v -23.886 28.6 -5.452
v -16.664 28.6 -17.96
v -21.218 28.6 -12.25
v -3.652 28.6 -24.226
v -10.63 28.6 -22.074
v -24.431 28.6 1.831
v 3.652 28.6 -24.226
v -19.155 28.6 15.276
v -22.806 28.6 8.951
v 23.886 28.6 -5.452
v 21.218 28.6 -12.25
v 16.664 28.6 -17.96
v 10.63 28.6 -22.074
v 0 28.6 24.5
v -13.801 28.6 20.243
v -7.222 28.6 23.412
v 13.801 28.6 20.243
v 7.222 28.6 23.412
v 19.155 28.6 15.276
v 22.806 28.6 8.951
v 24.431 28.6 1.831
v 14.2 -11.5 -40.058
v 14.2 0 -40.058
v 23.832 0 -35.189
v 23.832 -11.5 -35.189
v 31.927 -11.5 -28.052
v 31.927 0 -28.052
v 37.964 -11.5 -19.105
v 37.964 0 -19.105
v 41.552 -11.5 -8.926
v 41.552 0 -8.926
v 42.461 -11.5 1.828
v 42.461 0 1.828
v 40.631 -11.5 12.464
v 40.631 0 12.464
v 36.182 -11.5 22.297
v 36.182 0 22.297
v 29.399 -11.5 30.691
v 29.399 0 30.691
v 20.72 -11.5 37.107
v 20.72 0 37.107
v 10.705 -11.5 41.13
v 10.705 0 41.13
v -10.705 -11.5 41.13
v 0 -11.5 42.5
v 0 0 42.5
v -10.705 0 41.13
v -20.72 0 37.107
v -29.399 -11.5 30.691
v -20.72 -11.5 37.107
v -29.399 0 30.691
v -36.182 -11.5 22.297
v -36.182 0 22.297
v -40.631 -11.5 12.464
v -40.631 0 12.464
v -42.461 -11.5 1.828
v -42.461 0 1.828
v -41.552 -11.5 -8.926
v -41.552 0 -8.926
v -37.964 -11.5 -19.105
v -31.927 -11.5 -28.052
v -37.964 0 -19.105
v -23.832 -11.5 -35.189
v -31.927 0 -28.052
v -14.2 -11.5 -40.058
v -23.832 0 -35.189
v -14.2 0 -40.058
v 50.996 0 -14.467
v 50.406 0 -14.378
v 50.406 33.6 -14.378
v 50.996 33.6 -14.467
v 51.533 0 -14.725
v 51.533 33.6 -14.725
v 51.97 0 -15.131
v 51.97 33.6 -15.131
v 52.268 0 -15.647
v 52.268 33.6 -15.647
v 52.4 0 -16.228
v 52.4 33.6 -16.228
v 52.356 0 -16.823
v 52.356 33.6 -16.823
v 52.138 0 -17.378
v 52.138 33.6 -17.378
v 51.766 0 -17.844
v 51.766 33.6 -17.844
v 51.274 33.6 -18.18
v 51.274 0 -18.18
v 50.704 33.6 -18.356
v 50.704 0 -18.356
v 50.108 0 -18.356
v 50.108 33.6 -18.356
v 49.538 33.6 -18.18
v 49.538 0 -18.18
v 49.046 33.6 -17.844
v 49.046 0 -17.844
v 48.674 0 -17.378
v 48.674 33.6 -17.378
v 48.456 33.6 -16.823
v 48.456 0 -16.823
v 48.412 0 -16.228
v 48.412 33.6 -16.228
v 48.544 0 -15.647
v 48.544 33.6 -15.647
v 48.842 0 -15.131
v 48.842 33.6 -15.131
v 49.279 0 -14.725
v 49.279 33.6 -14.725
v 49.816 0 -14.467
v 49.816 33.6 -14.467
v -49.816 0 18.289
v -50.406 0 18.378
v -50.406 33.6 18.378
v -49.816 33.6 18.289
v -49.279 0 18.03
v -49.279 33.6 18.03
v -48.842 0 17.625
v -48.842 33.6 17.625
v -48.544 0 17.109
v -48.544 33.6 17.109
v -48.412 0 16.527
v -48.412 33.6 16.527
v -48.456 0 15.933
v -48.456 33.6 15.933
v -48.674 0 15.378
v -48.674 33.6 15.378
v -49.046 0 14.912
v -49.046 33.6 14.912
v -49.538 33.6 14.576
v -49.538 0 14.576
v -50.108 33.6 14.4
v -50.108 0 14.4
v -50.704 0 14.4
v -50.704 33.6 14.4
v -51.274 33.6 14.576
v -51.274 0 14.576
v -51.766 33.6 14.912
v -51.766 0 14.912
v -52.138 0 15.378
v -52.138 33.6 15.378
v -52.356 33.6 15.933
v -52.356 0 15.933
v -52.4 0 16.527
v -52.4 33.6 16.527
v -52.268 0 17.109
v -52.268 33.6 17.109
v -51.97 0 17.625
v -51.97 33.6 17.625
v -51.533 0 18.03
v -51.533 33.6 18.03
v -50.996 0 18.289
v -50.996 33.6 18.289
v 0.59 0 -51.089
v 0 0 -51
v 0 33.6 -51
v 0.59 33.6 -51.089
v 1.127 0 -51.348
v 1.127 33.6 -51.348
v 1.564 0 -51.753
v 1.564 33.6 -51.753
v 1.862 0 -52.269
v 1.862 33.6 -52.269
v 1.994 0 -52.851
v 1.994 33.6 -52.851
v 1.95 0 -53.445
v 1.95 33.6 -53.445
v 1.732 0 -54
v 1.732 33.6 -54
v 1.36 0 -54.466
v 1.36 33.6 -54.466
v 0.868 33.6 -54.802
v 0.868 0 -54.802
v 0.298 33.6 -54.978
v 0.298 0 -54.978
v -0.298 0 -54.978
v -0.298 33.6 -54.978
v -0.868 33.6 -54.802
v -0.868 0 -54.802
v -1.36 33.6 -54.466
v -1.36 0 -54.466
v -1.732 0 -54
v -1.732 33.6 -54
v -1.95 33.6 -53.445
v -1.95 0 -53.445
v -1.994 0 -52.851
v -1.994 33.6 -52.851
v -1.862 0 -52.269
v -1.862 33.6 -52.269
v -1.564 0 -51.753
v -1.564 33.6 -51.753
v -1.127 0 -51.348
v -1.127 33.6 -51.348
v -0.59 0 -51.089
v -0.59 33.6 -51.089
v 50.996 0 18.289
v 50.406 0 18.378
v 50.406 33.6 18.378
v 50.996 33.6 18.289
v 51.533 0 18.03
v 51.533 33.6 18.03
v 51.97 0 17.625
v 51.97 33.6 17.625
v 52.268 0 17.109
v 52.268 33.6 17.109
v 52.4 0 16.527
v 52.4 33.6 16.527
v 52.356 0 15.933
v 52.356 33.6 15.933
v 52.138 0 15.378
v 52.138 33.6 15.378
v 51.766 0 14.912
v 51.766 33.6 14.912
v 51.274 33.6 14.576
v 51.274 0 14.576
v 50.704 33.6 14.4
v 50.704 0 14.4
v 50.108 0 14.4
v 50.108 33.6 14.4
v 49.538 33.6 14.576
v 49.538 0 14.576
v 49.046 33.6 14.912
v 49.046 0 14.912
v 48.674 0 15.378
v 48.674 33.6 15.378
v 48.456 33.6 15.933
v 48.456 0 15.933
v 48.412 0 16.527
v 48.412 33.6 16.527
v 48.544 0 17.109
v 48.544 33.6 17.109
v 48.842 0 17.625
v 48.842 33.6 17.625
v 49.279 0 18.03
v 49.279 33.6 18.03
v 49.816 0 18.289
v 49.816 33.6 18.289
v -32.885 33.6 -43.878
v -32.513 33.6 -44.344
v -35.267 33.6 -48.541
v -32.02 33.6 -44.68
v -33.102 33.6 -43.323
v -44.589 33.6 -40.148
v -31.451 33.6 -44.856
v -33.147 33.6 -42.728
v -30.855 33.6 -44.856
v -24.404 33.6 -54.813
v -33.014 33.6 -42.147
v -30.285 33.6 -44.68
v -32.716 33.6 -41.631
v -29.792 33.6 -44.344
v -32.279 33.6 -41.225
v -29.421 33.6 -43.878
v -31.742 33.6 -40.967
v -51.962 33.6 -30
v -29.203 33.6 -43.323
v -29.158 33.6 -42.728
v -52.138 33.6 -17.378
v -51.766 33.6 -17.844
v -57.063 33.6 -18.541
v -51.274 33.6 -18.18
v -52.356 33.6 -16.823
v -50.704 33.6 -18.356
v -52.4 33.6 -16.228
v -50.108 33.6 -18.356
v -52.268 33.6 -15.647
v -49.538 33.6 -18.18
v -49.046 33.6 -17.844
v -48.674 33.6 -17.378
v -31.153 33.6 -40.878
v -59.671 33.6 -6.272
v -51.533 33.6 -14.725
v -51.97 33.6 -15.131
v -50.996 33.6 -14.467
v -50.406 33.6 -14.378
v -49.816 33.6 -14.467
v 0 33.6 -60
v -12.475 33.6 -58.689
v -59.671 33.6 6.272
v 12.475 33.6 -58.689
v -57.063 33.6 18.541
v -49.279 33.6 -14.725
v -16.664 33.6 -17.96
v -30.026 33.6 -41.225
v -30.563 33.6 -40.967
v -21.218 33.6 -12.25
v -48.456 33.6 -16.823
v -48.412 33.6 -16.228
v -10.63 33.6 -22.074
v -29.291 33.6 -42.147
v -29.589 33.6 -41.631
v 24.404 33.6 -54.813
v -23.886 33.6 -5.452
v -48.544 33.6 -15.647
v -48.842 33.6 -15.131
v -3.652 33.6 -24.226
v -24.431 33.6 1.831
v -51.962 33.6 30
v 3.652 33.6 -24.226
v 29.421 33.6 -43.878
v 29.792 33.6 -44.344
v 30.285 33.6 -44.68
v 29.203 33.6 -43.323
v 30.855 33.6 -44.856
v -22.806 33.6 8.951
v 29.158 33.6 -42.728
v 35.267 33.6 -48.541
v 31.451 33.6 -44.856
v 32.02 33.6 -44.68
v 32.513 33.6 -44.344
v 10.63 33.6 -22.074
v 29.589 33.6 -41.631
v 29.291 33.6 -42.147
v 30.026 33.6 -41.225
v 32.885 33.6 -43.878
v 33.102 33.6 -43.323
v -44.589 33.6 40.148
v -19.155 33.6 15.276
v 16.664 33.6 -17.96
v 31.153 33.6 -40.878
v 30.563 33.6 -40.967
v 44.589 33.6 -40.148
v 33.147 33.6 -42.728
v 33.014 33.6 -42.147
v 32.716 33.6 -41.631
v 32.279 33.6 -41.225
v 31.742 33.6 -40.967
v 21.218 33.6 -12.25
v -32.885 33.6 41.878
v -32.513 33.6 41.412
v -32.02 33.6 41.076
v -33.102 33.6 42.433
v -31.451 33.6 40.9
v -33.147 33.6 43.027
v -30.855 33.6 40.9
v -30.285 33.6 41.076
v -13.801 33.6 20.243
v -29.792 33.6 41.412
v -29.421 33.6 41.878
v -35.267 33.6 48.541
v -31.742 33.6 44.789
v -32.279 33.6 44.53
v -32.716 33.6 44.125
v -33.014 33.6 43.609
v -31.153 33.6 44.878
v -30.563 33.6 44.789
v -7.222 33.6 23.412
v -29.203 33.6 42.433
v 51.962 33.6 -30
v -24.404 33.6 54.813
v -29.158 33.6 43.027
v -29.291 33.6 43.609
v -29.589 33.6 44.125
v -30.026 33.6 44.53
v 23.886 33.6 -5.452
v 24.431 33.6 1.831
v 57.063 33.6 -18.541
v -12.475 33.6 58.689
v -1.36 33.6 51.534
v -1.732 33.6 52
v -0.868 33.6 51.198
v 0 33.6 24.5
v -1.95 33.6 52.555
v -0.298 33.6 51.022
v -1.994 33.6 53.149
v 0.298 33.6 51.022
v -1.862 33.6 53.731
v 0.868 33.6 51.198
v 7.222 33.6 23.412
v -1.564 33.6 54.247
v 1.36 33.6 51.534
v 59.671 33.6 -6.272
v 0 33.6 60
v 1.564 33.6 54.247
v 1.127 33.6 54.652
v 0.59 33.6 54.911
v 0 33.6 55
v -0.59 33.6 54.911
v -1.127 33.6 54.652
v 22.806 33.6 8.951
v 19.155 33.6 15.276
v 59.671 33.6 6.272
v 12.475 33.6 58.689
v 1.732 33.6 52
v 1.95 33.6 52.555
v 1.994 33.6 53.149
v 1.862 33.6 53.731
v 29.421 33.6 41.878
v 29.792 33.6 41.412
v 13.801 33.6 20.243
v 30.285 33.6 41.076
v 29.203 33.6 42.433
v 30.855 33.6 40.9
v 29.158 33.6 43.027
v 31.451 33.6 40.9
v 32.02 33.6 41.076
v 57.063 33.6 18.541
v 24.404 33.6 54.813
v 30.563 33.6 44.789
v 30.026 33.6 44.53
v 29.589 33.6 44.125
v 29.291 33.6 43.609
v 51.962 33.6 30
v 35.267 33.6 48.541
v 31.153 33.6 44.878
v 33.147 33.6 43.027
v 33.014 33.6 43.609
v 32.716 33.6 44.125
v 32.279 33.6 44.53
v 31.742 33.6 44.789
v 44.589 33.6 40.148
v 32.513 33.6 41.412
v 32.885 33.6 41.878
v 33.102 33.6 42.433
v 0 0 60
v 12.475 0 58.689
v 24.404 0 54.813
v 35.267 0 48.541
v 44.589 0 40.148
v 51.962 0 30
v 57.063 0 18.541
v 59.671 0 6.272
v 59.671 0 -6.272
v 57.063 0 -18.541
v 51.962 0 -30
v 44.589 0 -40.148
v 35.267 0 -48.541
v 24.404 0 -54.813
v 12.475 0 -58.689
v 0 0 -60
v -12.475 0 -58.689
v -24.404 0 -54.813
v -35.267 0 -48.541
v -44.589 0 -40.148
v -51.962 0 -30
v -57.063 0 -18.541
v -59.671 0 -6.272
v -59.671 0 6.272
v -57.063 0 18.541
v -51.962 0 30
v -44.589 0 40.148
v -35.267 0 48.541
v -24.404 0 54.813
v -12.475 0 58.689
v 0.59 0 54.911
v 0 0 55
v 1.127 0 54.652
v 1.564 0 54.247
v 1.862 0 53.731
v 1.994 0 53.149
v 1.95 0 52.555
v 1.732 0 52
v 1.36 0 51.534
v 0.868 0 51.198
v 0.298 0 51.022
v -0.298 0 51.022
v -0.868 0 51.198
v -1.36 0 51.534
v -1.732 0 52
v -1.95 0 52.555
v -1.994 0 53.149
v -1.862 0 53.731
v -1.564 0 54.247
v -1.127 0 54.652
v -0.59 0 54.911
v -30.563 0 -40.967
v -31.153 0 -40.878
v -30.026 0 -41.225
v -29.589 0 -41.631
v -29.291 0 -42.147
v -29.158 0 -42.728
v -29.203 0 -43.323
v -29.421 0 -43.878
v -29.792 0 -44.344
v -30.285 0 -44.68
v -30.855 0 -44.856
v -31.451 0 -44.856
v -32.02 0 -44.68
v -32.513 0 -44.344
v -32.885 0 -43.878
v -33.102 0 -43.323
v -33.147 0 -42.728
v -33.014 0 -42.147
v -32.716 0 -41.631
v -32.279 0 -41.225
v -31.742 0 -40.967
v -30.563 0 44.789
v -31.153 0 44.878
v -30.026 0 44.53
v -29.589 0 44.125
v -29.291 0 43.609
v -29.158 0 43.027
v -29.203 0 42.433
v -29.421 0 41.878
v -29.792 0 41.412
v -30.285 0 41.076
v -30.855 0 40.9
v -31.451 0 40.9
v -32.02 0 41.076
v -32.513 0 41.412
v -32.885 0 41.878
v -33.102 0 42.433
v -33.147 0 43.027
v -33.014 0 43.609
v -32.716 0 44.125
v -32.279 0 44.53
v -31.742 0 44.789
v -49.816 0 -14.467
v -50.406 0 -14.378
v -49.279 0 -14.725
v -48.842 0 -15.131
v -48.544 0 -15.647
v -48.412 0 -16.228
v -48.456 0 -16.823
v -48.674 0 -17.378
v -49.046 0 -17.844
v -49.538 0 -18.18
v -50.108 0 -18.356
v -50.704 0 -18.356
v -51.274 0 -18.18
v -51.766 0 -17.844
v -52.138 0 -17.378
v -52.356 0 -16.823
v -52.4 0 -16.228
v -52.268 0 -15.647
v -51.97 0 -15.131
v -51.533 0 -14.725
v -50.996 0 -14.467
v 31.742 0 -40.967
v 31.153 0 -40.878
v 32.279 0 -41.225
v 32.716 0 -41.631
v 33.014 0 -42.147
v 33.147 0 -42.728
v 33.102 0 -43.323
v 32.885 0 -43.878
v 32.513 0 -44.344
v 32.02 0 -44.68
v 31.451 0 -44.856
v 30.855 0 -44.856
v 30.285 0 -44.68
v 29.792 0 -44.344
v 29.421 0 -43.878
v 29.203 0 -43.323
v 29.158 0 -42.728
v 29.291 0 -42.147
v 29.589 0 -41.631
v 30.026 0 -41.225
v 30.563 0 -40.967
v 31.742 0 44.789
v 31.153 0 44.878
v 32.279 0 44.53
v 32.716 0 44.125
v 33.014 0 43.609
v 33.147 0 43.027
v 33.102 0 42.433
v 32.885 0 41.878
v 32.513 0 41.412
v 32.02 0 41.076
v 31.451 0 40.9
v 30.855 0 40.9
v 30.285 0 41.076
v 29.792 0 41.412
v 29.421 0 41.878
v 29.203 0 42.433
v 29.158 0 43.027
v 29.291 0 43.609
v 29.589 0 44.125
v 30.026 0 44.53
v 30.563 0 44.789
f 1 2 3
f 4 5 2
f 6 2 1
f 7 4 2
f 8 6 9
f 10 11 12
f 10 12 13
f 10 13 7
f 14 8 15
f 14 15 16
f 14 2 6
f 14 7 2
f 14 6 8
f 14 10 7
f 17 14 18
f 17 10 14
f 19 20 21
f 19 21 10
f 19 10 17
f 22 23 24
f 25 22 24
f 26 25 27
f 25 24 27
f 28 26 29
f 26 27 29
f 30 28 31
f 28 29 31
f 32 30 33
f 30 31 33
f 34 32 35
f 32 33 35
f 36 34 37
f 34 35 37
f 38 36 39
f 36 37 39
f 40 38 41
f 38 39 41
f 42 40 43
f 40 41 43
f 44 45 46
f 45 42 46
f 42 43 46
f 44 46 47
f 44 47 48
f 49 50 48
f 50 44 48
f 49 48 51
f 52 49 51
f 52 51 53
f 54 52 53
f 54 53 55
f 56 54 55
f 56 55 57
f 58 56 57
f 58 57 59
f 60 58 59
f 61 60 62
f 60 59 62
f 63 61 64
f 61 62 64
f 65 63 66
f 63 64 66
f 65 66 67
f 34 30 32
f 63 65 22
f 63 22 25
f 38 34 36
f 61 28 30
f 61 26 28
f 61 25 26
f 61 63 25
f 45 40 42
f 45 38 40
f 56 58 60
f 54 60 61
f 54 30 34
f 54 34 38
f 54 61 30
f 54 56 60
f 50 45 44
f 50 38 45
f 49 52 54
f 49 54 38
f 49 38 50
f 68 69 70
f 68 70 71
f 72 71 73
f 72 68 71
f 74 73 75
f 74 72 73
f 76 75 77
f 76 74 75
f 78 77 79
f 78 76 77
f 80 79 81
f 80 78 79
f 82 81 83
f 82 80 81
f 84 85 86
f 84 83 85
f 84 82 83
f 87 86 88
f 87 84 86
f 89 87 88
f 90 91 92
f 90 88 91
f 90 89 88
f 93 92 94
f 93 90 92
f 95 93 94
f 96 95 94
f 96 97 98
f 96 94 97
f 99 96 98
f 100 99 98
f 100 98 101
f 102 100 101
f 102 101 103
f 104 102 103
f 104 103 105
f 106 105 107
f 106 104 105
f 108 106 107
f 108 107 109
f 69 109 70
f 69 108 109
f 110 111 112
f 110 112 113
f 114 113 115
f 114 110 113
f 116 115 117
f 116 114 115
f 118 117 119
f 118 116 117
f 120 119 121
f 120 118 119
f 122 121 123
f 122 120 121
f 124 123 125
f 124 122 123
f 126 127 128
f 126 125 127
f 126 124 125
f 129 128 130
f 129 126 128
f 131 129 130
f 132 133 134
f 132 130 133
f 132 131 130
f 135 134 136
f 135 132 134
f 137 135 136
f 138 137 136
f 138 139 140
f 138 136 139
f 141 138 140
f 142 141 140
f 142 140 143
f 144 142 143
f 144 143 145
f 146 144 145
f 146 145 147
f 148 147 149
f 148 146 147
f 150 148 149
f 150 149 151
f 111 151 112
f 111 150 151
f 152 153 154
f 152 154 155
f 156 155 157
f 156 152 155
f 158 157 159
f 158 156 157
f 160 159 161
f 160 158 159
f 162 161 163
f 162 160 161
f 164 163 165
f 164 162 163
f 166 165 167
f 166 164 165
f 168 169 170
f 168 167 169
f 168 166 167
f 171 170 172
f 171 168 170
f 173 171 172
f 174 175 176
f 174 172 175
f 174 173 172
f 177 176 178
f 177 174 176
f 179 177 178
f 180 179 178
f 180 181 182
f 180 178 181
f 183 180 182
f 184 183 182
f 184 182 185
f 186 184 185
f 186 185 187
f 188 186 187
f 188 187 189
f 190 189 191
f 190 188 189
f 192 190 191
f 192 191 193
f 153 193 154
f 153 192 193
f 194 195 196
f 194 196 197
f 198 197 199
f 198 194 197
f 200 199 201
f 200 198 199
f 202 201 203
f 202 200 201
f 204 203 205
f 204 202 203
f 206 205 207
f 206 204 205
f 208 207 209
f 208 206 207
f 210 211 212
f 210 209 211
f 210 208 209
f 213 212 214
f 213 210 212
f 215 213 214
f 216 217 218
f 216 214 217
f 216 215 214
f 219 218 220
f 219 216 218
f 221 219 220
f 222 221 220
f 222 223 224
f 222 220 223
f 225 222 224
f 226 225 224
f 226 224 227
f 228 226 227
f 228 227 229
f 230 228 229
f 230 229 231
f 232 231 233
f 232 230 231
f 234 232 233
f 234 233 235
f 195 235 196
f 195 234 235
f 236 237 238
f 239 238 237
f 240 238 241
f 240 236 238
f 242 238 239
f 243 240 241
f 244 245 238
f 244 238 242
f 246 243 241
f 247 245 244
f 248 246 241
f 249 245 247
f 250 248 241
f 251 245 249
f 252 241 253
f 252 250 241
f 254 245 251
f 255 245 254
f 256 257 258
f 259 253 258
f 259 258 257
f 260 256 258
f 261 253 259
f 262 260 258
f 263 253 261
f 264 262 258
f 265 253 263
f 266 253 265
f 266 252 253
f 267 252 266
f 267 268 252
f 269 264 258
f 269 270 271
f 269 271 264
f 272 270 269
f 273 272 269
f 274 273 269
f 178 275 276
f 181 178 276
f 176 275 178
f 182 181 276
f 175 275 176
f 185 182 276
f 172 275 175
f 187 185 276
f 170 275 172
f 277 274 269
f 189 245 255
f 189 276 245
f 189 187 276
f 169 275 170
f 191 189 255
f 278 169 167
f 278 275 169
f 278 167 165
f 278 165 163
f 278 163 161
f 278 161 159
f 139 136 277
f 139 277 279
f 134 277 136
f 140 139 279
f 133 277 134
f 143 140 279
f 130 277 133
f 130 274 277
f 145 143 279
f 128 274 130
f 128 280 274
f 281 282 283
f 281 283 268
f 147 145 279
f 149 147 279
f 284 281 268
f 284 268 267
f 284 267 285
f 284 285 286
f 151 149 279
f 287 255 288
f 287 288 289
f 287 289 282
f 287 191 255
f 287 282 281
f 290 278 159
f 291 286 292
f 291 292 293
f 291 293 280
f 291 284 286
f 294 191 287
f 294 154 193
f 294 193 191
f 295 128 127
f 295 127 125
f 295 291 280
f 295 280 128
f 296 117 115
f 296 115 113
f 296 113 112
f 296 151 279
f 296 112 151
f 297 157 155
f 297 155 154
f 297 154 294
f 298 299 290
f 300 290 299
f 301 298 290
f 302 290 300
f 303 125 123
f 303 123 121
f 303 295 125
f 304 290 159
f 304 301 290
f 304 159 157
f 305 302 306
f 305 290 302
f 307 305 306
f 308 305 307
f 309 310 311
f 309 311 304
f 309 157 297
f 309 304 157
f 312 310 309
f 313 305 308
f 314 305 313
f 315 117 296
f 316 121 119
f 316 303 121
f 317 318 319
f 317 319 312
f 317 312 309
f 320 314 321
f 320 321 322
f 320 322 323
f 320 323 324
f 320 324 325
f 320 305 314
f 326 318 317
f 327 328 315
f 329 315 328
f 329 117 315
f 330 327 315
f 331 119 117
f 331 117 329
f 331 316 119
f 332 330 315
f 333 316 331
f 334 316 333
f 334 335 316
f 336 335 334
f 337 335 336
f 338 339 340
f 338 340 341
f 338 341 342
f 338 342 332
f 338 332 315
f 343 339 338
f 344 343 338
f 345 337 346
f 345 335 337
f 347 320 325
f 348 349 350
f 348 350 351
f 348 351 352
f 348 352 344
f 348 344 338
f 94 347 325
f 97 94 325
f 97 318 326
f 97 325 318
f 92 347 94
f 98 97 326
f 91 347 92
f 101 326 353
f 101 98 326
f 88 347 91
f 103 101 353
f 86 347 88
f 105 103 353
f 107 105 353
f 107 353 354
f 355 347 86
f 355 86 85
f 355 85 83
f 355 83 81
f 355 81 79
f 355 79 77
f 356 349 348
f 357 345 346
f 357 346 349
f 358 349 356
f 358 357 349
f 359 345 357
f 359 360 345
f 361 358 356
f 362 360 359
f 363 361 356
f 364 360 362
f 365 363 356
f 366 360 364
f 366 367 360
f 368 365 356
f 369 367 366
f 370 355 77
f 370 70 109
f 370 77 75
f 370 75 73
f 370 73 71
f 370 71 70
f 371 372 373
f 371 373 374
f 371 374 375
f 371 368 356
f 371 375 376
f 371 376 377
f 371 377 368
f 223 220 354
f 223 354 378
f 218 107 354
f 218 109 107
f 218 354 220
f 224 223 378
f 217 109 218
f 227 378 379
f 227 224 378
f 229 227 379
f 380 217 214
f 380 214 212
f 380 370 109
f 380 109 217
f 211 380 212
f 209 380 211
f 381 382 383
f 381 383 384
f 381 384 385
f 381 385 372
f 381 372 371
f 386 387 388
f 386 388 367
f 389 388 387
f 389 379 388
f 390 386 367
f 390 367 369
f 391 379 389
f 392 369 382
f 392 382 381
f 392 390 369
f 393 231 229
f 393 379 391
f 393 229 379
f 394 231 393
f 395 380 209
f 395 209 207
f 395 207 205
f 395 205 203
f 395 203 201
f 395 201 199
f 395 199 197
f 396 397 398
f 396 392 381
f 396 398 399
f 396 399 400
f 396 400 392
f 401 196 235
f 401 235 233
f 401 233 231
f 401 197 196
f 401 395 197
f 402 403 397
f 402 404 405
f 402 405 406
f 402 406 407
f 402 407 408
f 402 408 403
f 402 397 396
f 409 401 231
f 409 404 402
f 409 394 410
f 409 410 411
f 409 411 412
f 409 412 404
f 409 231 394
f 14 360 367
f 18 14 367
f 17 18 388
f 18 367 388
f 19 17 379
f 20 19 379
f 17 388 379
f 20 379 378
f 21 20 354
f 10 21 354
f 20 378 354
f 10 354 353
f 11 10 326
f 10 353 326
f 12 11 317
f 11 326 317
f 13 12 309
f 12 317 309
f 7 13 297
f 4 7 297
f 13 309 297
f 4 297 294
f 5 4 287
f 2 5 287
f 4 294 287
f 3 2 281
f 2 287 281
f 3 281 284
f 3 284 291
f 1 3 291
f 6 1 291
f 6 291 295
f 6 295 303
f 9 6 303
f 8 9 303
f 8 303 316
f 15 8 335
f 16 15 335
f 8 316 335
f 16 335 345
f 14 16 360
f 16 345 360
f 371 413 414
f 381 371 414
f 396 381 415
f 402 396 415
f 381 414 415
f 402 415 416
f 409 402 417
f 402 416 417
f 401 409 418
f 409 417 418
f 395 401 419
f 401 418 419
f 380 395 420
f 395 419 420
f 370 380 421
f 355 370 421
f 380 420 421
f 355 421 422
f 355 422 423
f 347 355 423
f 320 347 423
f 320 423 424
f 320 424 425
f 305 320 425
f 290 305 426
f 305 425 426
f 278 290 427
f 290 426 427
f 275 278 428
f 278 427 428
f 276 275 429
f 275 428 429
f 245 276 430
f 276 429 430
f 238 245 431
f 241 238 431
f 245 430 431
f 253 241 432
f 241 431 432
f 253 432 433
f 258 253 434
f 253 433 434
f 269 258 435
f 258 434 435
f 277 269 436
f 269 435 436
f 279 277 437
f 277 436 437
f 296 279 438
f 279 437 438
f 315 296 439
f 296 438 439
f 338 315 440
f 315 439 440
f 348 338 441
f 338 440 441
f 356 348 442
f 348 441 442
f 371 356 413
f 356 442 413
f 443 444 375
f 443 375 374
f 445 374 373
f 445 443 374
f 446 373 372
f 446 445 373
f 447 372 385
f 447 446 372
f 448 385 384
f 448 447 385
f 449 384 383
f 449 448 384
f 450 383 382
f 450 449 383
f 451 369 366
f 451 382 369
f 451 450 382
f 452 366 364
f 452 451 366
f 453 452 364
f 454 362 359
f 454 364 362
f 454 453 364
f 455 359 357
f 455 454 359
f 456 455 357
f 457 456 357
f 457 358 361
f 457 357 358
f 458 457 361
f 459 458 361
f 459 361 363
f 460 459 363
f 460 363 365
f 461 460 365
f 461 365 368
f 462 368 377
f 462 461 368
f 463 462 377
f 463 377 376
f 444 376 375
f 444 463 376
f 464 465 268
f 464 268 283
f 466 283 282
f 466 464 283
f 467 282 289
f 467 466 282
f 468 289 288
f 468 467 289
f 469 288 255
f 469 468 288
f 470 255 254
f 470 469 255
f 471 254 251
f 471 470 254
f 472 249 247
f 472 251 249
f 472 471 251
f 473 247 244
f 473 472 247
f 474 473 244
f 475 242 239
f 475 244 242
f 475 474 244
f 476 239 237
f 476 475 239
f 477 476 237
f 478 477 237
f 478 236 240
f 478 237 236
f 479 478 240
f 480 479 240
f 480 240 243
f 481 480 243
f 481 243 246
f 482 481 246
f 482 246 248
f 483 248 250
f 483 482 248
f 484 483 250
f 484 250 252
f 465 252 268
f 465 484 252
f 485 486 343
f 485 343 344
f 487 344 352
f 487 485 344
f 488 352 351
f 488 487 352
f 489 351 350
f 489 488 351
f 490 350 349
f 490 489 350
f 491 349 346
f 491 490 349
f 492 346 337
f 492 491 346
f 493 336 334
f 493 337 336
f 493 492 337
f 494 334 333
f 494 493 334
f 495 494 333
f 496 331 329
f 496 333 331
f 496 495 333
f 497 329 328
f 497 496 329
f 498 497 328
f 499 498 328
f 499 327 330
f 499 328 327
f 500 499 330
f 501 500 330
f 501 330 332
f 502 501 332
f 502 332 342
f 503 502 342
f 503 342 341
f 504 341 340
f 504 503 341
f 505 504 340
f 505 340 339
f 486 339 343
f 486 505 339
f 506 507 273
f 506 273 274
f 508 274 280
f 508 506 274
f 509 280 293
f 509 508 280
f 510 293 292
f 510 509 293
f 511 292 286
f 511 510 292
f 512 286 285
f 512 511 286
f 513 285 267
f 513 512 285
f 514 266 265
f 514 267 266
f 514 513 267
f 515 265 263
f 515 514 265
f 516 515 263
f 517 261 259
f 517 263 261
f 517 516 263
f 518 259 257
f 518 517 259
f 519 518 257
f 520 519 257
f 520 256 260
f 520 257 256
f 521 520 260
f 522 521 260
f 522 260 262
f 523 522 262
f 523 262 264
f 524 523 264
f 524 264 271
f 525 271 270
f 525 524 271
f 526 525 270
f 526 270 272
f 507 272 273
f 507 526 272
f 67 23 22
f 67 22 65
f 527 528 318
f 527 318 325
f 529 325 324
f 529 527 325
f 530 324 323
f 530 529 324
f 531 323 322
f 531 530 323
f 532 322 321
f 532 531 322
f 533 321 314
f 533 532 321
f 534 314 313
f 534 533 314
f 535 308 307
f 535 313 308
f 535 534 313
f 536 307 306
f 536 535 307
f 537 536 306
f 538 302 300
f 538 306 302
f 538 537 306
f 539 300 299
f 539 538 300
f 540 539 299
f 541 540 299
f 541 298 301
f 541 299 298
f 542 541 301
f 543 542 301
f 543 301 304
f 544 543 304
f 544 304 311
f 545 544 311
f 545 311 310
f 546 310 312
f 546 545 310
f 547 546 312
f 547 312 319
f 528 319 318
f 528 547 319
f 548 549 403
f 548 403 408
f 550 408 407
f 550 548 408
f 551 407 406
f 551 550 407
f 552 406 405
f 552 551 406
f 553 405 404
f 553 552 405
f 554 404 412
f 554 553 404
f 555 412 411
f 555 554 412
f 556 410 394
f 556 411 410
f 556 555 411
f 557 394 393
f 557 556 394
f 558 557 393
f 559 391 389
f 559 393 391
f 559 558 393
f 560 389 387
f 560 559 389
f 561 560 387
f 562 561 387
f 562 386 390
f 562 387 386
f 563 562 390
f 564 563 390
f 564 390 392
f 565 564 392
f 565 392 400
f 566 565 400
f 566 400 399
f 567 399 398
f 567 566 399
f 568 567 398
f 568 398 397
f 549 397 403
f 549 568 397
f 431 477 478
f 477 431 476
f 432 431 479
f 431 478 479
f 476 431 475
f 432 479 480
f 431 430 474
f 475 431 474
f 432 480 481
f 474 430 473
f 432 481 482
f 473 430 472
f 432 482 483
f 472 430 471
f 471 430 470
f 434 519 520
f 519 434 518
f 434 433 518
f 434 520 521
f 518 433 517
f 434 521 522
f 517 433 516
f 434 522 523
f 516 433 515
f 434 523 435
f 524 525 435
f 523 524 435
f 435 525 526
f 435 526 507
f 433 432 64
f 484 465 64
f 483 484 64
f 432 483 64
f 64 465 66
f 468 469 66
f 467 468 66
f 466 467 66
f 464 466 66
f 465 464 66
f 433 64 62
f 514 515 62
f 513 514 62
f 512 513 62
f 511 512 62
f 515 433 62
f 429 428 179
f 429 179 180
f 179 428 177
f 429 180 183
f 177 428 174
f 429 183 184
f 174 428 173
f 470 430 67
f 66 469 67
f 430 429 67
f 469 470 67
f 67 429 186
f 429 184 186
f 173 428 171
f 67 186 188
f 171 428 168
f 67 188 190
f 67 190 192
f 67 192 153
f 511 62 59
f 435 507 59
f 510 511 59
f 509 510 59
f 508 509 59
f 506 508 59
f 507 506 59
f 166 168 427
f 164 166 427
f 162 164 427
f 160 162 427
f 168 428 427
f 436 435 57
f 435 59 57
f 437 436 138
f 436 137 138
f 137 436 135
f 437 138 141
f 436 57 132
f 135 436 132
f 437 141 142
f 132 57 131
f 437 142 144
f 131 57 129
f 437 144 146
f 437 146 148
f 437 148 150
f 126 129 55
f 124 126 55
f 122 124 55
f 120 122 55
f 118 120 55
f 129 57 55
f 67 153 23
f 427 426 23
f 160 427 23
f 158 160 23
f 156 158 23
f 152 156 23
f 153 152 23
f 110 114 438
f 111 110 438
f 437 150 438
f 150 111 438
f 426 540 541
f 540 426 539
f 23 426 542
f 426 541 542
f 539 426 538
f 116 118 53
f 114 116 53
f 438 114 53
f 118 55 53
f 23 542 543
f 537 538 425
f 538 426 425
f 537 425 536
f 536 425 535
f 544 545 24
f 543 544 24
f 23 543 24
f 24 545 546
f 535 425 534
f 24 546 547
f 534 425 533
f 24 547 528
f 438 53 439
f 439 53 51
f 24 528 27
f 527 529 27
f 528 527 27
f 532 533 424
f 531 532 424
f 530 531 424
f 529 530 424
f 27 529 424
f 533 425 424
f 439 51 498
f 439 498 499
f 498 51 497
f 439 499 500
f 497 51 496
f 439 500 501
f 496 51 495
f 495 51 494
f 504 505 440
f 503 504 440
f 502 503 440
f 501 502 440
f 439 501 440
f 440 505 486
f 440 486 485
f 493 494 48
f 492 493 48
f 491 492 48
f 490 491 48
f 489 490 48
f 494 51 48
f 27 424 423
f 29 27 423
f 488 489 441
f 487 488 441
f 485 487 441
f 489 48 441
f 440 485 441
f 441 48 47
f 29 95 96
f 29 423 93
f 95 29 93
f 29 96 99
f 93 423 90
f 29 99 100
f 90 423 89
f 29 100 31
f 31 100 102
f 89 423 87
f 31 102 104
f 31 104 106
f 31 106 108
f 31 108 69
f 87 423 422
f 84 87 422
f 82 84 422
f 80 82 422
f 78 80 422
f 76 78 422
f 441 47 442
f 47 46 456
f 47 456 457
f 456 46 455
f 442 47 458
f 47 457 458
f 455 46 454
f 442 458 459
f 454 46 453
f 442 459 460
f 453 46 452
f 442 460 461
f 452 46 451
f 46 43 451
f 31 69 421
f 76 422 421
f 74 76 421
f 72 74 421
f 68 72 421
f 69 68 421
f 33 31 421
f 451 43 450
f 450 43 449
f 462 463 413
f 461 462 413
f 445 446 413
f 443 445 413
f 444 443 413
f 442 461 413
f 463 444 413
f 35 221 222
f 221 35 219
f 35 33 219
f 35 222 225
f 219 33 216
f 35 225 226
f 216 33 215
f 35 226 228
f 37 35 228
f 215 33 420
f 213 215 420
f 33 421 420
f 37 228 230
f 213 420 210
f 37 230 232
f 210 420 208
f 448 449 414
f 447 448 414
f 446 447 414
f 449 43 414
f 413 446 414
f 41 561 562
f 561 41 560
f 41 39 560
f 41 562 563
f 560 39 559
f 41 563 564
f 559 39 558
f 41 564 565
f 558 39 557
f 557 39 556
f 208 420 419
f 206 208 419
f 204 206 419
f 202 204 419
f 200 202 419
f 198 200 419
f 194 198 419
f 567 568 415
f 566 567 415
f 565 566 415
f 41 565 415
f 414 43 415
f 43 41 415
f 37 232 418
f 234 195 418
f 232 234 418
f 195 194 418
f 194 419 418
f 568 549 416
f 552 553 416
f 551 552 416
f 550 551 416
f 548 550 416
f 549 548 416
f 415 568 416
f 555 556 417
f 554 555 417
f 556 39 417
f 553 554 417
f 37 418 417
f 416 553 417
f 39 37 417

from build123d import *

# Parameters (mm, degrees)
SKETCH1_R               = 60
BOSS_EXTRUDE1_DEPTH     = 33.6
CUT_EXTRUDE2_DEPTH      = 92.263136041
CUT_EXTRUDE2_DEPTH_BACK = 92.263136041
SKETCH2_R               = 2
SKETCH4_R               = 24.5
CUT_EXTRUDE3_DEPTH      = 5
SKETCH5_R               = 42.5
BOSS_EXTRUDE2_DEPTH     = 11.5
CUT_EXTRUDE4_DEPTH      = 97.093756301
CUT_EXTRUDE4_DEPTH_BACK = 11.5


with BuildPart() as part:
    # Sketch1 → Boss-Extrude1 (new body)
    with BuildSketch(Plane(origin=(0, 0, 0), x_dir=(1, 0, 0), z_dir=(0, 1, 0))):
        with Locations(Location((0, 0, 0), (0, 0, 270))):
            Circle(SKETCH1_R)
    extrude(amount=BOSS_EXTRUDE1_DEPTH)

    # Sketch2 → Cut-Extrude2 (cut, two sides: drawn at the far end of the back side and taken through both)
    with BuildSketch(Plane(origin=(0, 33.6, 0), x_dir=(1, 0, 0), z_dir=(0, 1, 0)).offset(-CUT_EXTRUDE2_DEPTH_BACK)):
        with Locations(Location((0, 53, 0), (0, 0, 270))):
            Circle(SKETCH2_R)
        with Locations(Location((31.152618372, 42.877900702, 0), (0, 0, 270))):
            Circle(SKETCH2_R)
        with Locations(Location((50.405995364, 16.377900702, 0), (0, 0, 270))):
            Circle(SKETCH2_R)
        with Locations(Location((50.405995364, -16.377900702, 0), (0, 0, 270))):
            Circle(SKETCH2_R)
        with Locations(Location((31.152618372, -42.877900702, 0), (0, 0, 270))):
            Circle(SKETCH2_R)
        with Locations(Location((0, -53, 0), (0, 0, 270))):
            Circle(SKETCH2_R)
        with Locations(Location((-31.152618372, -42.877900702, 0), (0, 0, 270))):
            Circle(SKETCH2_R)
        with Locations(Location((-50.405995364, -16.377900702, 0), (0, 0, 270))):
            Circle(SKETCH2_R)
        with Locations(Location((-50.405995364, 16.377900702, 0), (0, 0, 270))):
            Circle(SKETCH2_R)
        with Locations(Location((-31.152618372, 42.877900702, 0), (0, 0, 270))):
            Circle(SKETCH2_R)
    extrude(amount=CUT_EXTRUDE2_DEPTH + CUT_EXTRUDE2_DEPTH_BACK, mode=Mode.SUBTRACT)

    # Sketch4 → Cut-Extrude3 (cut)
    with BuildSketch(Plane(origin=(0, 33.6, 0), x_dir=(1, 0, 0), z_dir=(0, 1, 0))):
        with Locations(Location((0, 0, 0), (0, 0, 270))):
            Circle(SKETCH4_R)
    extrude(amount=-CUT_EXTRUDE3_DEPTH, mode=Mode.SUBTRACT)

    # Sketch5 → Boss-Extrude2 (add)
    with BuildSketch(Plane.XZ):
        with Locations(Location((0, 0, 0), (0, 0, 90))):
            Circle(SKETCH5_R)
    extrude(amount=BOSS_EXTRUDE2_DEPTH)

    # Sketch6 → Cut-Extrude4 (cut, two sides: drawn at the far end of the back side and taken through both)
    with BuildSketch(Plane.XZ.offset(11.5).offset(-CUT_EXTRUDE4_DEPTH_BACK)):
        with BuildLine():
            Line((14.2, -40.057583552), (-14.2, -40.057583552))
            ThreePointArc((-14.2, -40.057583552), (0, -42.5), (14.2, -40.057583552))
        make_face()
    extrude(amount=CUT_EXTRUDE4_DEPTH + CUT_EXTRUDE4_DEPTH_BACK, mode=Mode.SUBTRACT)


solid = part.part
